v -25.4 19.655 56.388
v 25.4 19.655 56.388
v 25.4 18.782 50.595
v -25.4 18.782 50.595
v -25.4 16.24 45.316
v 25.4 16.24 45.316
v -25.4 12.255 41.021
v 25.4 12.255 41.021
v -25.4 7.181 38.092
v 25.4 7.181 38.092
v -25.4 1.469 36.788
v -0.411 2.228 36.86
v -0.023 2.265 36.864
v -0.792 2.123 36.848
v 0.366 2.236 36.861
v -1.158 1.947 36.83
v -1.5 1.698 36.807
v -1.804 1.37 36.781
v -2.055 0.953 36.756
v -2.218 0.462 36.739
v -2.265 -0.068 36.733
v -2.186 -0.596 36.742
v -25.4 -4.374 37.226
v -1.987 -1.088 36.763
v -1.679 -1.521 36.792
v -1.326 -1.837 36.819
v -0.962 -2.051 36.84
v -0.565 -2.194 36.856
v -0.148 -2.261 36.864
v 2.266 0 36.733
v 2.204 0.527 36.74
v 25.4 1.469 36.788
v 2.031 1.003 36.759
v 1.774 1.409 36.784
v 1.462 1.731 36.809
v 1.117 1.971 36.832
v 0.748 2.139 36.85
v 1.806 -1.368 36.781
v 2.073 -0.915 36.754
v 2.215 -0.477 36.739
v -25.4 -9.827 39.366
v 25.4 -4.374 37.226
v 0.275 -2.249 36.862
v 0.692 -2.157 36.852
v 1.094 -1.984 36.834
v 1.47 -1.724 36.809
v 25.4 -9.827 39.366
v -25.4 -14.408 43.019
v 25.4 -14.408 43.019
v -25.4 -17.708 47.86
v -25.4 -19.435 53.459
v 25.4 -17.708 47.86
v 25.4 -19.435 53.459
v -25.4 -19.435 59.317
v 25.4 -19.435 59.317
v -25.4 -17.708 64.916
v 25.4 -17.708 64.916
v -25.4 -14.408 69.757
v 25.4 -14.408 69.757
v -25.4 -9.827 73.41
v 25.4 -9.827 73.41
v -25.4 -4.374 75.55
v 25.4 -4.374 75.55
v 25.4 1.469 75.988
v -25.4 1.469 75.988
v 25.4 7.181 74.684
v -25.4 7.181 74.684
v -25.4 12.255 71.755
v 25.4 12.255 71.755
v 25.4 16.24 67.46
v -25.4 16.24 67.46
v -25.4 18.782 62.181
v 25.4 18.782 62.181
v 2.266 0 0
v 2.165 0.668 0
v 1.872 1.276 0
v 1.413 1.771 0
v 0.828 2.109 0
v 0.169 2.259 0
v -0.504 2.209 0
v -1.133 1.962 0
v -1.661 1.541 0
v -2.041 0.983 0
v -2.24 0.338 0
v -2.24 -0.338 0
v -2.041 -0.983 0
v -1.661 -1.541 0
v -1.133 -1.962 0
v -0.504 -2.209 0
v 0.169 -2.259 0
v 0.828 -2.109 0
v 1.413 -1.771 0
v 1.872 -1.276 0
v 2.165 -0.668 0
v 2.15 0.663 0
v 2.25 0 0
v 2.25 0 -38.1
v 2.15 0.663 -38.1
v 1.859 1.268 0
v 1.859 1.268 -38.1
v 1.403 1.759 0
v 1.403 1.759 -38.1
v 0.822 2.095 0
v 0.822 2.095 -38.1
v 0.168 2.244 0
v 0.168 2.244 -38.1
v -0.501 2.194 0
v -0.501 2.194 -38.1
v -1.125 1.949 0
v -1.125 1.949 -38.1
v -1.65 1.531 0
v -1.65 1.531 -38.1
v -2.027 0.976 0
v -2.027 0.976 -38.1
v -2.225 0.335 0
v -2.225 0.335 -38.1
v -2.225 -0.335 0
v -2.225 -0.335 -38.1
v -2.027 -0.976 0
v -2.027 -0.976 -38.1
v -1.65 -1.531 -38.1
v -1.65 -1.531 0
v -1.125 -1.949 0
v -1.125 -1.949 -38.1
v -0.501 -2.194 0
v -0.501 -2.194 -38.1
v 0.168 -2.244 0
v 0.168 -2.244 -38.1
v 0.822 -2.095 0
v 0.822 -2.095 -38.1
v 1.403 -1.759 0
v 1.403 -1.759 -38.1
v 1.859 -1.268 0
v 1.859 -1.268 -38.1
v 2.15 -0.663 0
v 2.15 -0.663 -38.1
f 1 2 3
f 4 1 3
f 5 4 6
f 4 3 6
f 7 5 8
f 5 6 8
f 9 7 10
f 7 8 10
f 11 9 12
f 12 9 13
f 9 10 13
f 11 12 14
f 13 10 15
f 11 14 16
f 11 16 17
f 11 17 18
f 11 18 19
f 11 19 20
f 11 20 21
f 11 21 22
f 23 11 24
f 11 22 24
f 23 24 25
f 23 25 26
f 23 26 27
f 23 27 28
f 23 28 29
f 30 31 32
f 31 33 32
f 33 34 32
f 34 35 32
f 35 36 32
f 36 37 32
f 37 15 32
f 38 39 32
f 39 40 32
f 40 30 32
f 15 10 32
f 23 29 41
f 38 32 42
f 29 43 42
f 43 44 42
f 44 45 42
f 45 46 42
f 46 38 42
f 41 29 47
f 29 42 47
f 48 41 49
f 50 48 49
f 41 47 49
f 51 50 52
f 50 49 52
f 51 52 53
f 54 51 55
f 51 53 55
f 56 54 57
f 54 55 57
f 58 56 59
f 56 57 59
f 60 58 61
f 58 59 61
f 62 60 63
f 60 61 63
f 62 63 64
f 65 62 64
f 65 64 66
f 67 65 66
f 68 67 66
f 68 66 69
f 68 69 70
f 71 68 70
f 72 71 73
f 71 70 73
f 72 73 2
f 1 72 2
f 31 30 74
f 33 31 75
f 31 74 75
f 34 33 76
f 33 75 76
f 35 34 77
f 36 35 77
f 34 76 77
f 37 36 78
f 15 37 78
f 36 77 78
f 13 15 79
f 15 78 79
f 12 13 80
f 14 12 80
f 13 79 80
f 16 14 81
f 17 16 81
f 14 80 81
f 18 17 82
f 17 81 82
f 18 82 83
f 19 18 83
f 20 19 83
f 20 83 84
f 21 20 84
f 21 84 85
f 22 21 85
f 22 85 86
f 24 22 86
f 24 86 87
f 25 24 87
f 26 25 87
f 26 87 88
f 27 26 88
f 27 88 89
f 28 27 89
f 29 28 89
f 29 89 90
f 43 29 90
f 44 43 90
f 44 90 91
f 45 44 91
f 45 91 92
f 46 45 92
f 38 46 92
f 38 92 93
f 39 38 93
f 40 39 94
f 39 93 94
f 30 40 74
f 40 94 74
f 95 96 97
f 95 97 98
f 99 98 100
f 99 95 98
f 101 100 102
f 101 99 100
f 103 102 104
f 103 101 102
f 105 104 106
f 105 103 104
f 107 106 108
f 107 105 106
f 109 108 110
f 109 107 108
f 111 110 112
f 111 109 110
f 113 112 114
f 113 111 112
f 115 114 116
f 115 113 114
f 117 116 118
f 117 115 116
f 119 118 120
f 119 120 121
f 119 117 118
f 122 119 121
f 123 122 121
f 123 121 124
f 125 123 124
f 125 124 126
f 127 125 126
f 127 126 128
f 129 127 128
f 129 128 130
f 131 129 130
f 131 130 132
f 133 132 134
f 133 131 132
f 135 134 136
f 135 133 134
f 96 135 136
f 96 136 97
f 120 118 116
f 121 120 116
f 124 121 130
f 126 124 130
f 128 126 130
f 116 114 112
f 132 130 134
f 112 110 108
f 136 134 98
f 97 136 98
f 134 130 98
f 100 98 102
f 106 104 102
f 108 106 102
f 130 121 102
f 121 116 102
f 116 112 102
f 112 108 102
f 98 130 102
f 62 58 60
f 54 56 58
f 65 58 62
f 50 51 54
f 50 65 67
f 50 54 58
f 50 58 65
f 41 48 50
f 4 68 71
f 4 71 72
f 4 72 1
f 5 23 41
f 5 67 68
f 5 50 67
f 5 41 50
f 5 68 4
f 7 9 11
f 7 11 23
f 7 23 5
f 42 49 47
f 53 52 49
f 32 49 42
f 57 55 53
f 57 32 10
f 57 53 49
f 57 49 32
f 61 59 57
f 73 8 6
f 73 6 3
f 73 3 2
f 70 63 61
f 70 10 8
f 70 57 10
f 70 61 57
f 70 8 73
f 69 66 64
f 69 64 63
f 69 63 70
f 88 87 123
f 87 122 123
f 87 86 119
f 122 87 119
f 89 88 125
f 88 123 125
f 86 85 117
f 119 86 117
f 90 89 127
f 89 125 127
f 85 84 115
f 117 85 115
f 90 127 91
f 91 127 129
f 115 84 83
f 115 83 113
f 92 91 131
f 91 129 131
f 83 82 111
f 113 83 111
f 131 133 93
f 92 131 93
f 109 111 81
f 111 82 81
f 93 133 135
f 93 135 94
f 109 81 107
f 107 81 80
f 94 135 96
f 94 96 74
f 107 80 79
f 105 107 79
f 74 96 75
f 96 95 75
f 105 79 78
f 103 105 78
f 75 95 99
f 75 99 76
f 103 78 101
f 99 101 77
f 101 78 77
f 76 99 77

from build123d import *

# Parameters (mm, degrees)
F0_R      = 19.654875
F1_DEPTH  = 25.4
F1_FACE_R = 19.654875
F2_DEPTH  = 25.4
F3_R      = 2.265589
F4_DEPTH  = 50.8
F5_R      = 2.250211
F6_DEPTH  = 38.1


with BuildPart() as f1:
    # F0 (on Right) → F1 (new body)
    with BuildSketch(Plane.YZ):
        with Locations((0, 56.388002)):
            Circle(F0_R)
    extrude(amount=F1_DEPTH)

    # F1_face (on face) → F2 (join)
    with BuildSketch(Plane(origin=(0, 0, 56.388002), x_dir=(0, 1, 0), z_dir=(-1, 0, 0))):
        Circle(F1_FACE_R)
    extrude(amount=F2_DEPTH)

    # F3 (on Top) → F4 (join)
    with BuildSketch(Plane.XY):
        Circle(F3_R)
    extrude(amount=F4_DEPTH)

    # F5 (on Top) → F6 (join)
    with BuildSketch(Plane.XY):
        Circle(F5_R)
    extrude(amount=-F6_DEPTH)


solid = f1.part
